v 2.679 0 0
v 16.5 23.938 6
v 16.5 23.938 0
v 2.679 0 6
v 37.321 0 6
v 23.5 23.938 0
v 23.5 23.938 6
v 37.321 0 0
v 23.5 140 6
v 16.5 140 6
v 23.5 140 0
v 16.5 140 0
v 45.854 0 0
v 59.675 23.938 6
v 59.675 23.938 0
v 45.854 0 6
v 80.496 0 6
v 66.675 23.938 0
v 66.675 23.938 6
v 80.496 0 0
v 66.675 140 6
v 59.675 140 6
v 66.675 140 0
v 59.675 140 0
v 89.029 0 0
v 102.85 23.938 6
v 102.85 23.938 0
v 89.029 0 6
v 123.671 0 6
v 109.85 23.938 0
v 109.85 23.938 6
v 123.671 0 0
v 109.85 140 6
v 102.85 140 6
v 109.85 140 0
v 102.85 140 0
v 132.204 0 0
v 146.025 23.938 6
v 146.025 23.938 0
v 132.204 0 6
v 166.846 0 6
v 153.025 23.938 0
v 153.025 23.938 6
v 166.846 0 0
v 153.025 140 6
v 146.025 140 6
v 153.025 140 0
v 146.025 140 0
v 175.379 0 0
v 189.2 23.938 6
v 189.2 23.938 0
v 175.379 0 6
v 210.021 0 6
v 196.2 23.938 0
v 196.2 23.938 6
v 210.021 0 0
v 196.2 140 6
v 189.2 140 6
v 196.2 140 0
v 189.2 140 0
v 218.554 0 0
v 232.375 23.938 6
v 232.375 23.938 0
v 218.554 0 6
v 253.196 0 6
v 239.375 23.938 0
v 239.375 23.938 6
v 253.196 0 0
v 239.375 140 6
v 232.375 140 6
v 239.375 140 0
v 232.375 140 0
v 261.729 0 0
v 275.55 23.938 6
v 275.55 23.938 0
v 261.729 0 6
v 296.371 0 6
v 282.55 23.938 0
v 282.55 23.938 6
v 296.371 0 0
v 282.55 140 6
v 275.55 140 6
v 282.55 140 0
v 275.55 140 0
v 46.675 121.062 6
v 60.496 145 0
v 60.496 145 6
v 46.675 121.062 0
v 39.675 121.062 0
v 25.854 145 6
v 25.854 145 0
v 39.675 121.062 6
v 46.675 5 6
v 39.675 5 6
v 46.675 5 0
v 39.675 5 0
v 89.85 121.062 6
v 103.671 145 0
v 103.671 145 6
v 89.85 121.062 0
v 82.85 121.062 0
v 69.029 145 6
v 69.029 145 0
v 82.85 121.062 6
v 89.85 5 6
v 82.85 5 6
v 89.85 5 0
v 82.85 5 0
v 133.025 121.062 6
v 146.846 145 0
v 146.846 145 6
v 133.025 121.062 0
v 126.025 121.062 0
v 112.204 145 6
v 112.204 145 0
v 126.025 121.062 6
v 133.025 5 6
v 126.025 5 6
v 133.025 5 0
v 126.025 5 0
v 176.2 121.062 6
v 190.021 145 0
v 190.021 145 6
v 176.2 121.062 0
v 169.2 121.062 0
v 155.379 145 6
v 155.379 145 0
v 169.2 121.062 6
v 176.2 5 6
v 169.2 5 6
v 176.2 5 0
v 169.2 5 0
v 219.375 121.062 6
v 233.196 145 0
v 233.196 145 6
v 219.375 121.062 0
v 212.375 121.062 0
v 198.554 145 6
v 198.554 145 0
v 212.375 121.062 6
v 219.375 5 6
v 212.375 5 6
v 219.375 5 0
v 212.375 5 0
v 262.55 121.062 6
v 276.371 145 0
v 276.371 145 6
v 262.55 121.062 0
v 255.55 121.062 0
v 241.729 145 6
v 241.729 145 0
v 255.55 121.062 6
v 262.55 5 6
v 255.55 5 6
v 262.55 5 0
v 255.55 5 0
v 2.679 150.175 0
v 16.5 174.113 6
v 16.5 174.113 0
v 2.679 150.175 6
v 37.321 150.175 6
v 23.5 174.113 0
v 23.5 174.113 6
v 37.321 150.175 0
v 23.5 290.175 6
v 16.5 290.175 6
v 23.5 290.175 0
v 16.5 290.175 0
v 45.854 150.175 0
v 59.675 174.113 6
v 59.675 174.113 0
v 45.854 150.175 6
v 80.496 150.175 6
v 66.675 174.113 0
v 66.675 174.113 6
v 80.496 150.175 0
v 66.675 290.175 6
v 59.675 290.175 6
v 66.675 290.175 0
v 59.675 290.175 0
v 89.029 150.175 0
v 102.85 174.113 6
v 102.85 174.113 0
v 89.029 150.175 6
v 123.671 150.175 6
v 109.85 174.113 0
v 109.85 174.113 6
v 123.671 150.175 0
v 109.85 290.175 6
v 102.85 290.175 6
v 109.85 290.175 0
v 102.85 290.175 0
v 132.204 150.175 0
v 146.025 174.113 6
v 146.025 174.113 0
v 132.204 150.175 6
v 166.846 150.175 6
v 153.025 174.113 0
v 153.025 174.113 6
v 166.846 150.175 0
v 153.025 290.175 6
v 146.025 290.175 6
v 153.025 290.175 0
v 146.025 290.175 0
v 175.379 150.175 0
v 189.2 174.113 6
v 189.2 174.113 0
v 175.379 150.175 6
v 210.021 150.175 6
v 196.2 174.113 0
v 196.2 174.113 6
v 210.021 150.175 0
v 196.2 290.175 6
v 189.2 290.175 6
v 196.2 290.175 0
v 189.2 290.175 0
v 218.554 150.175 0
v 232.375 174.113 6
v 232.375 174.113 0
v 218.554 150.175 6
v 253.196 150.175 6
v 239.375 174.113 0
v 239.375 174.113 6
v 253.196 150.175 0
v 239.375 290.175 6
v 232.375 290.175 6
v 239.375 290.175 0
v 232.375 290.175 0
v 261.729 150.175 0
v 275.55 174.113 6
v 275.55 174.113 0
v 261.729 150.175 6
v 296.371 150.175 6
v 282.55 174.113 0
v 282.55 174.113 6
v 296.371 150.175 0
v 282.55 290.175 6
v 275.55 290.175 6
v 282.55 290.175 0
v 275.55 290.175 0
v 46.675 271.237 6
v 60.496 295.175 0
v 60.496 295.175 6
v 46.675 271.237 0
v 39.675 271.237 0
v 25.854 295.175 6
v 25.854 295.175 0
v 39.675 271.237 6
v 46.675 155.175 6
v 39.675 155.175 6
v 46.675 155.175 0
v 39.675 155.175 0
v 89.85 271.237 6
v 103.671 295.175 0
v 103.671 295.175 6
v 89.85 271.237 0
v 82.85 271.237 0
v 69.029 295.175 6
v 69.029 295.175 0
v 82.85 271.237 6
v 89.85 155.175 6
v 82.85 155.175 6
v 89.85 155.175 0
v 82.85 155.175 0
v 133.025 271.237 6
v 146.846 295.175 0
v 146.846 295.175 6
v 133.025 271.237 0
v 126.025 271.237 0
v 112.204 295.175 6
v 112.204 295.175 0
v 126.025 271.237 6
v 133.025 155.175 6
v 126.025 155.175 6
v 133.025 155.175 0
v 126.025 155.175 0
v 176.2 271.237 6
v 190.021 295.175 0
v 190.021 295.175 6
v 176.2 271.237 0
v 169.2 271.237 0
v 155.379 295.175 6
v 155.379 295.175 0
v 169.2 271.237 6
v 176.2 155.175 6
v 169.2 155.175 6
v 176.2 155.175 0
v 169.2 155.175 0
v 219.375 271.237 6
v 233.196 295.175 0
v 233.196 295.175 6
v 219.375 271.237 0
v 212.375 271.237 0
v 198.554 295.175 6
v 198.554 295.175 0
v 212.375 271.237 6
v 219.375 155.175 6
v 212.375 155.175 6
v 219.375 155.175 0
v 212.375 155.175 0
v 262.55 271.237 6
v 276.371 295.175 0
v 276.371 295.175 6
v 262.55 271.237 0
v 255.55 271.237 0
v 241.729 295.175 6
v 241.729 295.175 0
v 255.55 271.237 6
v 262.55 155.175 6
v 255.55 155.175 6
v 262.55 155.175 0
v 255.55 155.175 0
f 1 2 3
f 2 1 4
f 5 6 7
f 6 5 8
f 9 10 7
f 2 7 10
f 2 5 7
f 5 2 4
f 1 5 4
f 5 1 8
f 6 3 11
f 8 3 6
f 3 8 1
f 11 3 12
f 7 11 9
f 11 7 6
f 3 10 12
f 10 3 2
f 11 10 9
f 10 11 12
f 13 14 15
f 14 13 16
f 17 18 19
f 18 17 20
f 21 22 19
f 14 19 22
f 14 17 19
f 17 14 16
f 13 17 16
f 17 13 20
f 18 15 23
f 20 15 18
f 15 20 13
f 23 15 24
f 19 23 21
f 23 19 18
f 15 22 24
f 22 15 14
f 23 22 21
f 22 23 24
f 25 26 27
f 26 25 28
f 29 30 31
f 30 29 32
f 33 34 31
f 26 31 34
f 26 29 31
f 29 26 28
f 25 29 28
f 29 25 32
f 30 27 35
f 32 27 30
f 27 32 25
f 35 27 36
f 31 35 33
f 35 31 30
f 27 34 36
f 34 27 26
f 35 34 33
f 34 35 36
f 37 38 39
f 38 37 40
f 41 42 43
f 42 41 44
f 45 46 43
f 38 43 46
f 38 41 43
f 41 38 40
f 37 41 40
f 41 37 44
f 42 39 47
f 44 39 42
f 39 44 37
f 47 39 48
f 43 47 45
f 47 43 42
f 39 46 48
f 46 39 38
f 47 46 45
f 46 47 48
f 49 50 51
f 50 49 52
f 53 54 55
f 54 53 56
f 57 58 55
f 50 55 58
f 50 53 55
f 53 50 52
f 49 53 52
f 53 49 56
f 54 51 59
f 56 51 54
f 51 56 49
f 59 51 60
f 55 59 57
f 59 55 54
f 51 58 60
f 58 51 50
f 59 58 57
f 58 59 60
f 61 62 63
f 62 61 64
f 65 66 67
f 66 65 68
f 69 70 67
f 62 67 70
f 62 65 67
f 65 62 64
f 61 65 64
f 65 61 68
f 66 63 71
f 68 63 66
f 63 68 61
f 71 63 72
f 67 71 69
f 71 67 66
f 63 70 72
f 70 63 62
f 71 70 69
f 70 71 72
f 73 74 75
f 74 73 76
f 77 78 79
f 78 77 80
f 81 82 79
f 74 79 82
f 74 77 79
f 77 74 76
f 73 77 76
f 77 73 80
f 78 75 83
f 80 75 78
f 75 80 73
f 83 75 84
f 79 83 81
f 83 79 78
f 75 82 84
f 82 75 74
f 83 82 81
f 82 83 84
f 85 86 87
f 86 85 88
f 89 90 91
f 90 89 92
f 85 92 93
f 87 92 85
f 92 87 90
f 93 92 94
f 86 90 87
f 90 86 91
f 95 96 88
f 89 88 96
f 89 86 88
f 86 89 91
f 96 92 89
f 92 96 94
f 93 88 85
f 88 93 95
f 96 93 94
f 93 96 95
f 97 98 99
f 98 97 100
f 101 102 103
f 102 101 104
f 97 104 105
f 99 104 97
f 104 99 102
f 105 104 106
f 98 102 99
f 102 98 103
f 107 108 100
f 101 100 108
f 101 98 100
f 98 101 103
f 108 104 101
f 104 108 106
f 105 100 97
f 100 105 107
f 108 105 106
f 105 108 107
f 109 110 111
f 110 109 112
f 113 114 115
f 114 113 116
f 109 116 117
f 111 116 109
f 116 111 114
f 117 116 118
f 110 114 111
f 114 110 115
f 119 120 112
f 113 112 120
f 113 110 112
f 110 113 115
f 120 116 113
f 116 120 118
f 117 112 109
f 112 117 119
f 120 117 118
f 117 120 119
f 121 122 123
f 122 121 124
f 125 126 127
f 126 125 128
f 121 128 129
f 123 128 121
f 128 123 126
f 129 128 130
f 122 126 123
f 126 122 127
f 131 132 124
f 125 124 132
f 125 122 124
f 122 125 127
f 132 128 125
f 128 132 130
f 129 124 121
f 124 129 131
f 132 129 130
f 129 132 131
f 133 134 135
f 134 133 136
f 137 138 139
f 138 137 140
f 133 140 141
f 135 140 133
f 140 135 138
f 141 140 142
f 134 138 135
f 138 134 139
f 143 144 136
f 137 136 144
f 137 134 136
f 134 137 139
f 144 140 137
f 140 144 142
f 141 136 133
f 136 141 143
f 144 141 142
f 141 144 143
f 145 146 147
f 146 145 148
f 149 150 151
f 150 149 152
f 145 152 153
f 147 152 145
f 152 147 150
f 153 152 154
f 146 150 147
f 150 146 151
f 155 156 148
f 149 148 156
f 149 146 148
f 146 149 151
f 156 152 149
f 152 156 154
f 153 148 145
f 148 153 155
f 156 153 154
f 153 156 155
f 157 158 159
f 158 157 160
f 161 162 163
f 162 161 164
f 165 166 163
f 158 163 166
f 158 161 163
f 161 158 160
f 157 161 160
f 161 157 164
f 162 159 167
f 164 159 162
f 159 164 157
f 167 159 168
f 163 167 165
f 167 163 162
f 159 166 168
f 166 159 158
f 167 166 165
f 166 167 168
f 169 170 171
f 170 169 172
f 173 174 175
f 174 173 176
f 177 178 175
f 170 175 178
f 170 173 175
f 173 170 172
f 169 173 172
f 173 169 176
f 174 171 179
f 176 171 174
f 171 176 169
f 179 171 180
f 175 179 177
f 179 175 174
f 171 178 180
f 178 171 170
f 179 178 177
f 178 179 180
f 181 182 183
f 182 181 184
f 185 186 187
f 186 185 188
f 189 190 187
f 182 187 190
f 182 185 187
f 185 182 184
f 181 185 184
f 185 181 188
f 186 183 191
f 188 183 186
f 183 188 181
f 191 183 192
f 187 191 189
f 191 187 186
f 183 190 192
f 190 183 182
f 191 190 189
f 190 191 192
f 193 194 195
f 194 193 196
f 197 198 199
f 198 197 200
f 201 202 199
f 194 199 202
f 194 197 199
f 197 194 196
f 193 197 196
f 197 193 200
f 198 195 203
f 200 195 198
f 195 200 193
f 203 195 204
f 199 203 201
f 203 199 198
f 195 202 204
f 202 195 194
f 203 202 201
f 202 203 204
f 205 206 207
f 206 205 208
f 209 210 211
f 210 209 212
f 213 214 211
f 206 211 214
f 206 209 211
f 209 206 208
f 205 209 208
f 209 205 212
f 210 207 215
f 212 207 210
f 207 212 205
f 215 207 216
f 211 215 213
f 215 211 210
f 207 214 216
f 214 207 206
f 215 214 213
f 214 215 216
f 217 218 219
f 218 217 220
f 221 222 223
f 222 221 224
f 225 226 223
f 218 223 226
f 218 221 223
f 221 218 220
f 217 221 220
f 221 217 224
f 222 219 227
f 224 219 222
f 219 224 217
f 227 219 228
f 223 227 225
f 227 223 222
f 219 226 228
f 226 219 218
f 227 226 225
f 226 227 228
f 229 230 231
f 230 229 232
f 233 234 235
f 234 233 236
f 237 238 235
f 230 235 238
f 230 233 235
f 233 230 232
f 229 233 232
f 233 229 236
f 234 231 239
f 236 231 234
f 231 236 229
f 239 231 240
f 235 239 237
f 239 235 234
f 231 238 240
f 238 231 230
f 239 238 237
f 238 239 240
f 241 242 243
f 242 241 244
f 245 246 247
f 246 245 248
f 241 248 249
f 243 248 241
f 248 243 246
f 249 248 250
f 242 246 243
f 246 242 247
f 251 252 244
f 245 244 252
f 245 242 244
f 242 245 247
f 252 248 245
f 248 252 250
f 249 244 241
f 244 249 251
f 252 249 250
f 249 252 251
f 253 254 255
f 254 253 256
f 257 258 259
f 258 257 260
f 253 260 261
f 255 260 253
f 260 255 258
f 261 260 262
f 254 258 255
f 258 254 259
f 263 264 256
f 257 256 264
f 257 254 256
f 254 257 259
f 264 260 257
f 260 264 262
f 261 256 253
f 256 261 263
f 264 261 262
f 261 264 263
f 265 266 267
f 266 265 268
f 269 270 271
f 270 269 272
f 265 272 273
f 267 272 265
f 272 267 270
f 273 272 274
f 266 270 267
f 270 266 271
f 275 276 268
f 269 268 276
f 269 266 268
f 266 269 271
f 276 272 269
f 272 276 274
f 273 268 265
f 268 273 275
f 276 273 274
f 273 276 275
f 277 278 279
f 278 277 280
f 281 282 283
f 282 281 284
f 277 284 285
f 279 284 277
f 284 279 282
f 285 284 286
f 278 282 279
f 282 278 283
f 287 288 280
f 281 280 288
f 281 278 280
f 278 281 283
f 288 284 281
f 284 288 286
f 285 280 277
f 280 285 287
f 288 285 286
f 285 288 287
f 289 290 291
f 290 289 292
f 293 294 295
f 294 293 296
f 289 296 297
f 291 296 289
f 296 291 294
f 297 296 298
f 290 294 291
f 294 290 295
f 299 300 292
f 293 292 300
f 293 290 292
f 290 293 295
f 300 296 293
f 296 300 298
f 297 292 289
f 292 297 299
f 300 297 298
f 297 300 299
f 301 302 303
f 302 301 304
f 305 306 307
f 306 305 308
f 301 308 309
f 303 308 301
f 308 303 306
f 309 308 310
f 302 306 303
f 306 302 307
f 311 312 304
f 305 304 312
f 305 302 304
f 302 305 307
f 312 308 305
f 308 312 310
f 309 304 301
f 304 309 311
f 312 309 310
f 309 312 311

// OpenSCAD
$bit_diam = 3.175;
$valve_r = 20;
$arm_len = 130;

module piston() {
    union() {
        translate([20,10,0]) {
            rotate([0,0,-30]) {
                cylinder(r=$valve_r, h=6, $fn=3);
            }
            translate([-7/2,0,0]) {
                cube([7,$arm_len,6]);
            }
        }
    }
}

module layout() {
    for (iter = [0:6]) {
        translate([iter*($valve_r*2+$bit_diam),0,0]) {
            piston();
        }
    }   
    
    for (iter = [1:6]) {
        translate([iter*($valve_r*2+$bit_diam)+$valve_r,$arm_len + $valve_r-5,0]) {
            rotate([0,0,180]) {
                piston();
            }
        }
    }
    
    translate([0, $valve_r+$arm_len + $bit_diam-3, 0]) {
        for (iter = [0:6]) {
            translate([iter*($valve_r*2+$bit_diam),0,0]) {
                piston();
            }
        }
    
        for (iter = [1:6]) {
            translate([iter*($valve_r*2+$bit_diam)+$valve_r,$arm_len + $valve_r-5,0]) {
                rotate([0,0,180]) {
                    piston();
                }
            }
        }
    }
}

$2d = 0;
if ($2d) {
    projection(cut=true) {
       translate([0,0,0]) rotate([0,0,0]) {
           layout();
       }
    }
} else {
    layout();
}
